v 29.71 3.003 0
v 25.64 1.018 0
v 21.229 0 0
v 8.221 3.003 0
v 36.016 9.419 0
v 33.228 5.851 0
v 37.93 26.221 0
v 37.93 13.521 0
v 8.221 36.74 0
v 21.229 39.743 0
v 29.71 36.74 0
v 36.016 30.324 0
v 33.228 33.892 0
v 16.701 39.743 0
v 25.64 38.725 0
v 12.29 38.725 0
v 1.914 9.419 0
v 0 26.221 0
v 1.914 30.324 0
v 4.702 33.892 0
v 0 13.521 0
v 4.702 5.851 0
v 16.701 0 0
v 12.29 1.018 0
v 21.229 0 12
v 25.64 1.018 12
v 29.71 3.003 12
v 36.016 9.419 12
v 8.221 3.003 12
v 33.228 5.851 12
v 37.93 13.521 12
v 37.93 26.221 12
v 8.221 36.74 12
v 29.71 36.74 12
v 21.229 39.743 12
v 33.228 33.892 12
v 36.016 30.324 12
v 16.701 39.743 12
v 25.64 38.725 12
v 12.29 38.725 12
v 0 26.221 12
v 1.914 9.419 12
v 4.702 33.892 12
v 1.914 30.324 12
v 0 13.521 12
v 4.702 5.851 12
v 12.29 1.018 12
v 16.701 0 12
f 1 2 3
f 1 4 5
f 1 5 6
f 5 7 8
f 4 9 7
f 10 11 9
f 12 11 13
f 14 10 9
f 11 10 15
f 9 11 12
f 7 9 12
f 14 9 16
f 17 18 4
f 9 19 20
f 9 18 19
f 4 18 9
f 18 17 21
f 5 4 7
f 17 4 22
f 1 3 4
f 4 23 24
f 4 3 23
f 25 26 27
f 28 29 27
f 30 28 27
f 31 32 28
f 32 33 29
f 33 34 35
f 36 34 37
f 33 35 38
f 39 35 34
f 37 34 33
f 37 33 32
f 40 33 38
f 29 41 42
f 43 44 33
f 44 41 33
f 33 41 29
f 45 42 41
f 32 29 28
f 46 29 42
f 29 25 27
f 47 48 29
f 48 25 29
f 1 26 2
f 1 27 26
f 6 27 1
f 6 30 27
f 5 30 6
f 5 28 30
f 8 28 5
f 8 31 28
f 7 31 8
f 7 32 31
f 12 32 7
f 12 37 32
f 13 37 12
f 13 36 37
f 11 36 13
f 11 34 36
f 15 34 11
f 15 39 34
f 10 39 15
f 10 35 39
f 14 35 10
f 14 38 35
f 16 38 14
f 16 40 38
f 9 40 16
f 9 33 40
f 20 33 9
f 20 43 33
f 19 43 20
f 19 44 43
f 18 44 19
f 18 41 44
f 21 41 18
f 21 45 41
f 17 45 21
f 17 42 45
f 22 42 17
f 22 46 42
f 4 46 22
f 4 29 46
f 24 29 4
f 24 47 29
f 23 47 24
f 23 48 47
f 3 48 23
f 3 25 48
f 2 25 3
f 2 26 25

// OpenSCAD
$fn = 32;

// ----------------------------------------------------------------------
// Flat adaptor: double_d, 12 mm thick
// ----------------------------------------------------------------------

// --- parameters (mm) ---
profile_height = 12;      // extrusion height
profile_points = 24;      // points of the closed outline

profile = [[37.93, 26.221], [36.016, 30.324], [33.228, 33.892], [29.71, 36.74], [25.64, 38.725], [21.229, 39.743], [16.701, 39.743], [12.29, 38.725], [8.221, 36.74], [4.702, 33.892], [1.914, 30.324], [0, 26.221], [0, 13.521], [1.914, 9.419], [4.702, 5.851], [8.221, 3.003], [12.29, 1.018], [16.701, 0], [21.229, 0], [25.64, 1.018], [29.71, 3.003], [33.228, 5.851], [36.016, 9.419], [37.93, 13.521]];  // single closed polygon, 24 points, counter clockwise

// --- the one profile operation ---
linear_extrude(height = profile_height) polygon(points = profile);
